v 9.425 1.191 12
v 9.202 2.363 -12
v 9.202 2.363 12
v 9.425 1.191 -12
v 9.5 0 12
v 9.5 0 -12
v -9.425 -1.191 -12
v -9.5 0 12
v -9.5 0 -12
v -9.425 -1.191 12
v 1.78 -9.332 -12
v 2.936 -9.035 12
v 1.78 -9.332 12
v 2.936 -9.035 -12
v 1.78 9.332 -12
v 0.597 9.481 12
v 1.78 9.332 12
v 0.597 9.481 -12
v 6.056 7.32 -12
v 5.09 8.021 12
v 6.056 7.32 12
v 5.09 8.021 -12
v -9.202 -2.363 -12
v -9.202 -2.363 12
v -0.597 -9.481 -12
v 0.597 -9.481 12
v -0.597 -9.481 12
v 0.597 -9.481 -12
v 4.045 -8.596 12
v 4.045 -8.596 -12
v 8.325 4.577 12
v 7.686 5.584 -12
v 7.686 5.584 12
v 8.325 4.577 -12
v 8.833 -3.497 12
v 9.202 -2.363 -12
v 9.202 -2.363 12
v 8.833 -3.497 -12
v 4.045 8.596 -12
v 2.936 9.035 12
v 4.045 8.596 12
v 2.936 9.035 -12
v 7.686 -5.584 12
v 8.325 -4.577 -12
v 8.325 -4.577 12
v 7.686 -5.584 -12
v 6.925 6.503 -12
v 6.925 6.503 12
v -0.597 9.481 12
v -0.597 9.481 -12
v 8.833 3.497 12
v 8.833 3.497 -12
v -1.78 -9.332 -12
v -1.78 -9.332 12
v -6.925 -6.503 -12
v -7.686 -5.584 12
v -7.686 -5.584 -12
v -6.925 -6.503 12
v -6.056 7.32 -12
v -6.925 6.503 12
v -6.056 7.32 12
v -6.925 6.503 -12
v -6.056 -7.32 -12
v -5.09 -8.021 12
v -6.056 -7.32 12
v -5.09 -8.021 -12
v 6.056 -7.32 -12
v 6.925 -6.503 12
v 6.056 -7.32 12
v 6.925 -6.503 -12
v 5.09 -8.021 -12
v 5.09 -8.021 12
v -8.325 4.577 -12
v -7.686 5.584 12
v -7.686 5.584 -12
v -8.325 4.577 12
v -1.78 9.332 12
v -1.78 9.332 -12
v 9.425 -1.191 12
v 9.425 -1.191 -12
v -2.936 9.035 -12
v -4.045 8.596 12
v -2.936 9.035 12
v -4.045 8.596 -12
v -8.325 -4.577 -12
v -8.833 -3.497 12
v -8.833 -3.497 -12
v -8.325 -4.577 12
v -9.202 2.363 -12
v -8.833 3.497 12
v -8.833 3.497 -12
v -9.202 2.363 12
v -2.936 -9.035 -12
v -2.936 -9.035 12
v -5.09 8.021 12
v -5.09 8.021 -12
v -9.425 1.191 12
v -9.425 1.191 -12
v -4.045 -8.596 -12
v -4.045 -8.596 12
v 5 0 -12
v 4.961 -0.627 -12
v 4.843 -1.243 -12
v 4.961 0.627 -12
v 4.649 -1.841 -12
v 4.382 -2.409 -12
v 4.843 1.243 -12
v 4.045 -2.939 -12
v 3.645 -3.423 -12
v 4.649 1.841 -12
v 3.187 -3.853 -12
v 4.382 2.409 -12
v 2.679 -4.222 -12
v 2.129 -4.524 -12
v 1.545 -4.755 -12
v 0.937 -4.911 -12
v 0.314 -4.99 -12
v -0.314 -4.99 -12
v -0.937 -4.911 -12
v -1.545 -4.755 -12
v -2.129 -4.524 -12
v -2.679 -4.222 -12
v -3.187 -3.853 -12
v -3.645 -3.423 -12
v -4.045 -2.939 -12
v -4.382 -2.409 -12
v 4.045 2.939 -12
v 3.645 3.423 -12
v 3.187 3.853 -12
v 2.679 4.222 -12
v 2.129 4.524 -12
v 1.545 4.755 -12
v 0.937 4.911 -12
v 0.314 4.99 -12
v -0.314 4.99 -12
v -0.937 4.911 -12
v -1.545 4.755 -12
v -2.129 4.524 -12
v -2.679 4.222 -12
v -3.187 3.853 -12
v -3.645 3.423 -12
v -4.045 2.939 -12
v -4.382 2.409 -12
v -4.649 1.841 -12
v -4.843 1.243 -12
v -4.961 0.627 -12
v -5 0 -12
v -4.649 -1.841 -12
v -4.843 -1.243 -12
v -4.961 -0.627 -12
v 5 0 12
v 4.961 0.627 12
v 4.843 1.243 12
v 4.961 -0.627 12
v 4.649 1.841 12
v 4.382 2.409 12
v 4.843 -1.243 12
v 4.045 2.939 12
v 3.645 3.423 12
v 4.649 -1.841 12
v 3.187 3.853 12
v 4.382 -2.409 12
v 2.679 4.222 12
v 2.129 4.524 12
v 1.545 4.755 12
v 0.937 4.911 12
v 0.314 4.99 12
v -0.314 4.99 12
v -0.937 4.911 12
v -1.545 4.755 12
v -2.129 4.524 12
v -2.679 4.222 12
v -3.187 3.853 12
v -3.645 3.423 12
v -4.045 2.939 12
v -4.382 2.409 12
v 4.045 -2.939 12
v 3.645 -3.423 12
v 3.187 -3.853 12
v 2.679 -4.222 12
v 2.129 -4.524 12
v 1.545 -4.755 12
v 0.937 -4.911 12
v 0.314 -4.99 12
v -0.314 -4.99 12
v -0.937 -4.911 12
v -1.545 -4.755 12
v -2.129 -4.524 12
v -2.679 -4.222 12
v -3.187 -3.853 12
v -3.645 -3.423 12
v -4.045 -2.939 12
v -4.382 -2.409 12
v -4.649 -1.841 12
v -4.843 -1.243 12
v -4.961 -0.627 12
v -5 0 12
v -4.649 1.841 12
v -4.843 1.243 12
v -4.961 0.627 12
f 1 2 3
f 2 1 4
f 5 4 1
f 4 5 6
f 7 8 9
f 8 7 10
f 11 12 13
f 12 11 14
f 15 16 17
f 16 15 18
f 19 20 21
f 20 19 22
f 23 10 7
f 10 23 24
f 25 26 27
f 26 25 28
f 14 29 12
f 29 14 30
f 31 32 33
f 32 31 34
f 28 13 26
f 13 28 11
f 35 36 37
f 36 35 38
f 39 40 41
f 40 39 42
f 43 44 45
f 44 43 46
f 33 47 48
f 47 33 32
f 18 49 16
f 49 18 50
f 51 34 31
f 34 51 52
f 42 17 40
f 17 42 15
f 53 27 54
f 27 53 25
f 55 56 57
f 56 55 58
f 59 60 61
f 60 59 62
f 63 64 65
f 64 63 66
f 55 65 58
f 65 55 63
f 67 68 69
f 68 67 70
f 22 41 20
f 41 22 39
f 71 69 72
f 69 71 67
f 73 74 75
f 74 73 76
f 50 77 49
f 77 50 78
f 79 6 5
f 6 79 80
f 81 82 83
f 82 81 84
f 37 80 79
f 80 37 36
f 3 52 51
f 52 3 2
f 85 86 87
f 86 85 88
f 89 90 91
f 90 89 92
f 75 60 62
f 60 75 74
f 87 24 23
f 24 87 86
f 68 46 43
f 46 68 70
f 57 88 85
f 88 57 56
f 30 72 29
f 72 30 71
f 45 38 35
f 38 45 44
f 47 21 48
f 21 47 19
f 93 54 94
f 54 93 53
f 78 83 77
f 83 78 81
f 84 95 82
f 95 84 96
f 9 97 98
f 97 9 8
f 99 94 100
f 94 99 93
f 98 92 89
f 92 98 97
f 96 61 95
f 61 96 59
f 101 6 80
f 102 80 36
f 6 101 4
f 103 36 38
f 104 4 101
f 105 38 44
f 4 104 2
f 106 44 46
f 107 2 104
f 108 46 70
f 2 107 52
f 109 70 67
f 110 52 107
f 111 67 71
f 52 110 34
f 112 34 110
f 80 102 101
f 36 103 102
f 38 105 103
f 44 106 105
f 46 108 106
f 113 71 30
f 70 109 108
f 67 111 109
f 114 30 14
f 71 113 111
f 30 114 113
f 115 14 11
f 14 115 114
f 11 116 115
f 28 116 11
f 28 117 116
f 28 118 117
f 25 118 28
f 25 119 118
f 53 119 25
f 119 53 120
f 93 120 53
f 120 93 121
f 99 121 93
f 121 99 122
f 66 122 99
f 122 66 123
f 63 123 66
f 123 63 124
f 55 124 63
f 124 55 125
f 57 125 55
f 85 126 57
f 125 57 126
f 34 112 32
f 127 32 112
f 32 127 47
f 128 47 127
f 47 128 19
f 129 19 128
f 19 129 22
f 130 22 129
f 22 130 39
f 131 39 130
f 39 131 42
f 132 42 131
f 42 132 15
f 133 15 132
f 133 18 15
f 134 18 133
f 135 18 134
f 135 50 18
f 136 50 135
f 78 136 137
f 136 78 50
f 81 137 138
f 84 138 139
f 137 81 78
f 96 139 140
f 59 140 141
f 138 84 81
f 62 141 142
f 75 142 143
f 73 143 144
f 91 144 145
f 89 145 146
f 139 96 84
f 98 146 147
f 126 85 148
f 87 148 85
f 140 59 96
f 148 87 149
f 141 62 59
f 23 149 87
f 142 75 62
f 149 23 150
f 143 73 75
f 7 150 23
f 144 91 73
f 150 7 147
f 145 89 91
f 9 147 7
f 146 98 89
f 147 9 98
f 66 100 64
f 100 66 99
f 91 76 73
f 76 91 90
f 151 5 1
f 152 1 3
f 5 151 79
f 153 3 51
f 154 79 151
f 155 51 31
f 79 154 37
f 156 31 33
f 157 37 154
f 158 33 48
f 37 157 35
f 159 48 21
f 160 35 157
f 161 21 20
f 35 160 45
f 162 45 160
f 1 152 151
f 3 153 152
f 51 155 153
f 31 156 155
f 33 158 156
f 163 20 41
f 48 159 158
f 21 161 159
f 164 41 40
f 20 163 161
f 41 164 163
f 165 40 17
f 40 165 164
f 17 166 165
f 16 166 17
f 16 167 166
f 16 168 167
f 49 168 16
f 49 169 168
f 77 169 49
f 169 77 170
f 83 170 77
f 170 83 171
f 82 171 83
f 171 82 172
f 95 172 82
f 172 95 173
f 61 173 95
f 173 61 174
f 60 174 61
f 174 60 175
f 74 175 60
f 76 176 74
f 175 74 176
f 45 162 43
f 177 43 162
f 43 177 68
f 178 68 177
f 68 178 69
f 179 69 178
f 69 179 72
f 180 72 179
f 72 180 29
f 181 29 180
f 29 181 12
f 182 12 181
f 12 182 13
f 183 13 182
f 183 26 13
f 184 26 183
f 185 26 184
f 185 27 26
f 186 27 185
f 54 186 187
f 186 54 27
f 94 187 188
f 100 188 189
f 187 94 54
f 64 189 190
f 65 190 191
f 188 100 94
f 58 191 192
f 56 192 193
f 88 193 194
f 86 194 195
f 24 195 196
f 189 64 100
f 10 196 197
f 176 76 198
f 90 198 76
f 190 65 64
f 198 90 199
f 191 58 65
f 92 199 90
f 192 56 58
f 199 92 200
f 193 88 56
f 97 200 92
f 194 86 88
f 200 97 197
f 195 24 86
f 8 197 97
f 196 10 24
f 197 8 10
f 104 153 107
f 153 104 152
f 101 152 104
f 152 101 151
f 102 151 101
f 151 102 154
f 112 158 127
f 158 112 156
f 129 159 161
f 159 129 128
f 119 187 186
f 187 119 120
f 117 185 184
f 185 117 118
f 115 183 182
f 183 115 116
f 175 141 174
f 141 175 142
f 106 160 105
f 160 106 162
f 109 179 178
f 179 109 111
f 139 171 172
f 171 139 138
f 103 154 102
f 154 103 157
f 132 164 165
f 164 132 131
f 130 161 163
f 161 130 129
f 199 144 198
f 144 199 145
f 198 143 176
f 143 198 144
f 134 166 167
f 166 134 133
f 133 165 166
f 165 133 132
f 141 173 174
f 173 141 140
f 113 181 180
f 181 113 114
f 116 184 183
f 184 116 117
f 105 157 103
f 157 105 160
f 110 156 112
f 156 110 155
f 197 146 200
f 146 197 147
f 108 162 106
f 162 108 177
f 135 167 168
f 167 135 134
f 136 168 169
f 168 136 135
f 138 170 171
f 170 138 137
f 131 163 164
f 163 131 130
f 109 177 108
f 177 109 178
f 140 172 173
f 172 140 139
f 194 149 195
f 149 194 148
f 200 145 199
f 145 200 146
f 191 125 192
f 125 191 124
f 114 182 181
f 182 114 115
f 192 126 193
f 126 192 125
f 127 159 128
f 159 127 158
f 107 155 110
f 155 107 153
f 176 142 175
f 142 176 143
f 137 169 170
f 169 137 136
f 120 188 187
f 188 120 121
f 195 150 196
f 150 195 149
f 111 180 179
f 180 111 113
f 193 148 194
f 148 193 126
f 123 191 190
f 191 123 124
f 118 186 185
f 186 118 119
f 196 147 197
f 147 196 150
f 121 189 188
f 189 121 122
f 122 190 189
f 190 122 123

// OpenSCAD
$fn = 50;


difference() {
	union() {
		translate(v = [0, 0, -12.0000000000]) {
			cylinder(h = 24, r = 9.5000000000);
		}
	}
	union() {
		translate(v = [0, 0, -100.0000000000]) {
			cylinder(h = 200, r = 5.0000000000);
		}
	}
}
